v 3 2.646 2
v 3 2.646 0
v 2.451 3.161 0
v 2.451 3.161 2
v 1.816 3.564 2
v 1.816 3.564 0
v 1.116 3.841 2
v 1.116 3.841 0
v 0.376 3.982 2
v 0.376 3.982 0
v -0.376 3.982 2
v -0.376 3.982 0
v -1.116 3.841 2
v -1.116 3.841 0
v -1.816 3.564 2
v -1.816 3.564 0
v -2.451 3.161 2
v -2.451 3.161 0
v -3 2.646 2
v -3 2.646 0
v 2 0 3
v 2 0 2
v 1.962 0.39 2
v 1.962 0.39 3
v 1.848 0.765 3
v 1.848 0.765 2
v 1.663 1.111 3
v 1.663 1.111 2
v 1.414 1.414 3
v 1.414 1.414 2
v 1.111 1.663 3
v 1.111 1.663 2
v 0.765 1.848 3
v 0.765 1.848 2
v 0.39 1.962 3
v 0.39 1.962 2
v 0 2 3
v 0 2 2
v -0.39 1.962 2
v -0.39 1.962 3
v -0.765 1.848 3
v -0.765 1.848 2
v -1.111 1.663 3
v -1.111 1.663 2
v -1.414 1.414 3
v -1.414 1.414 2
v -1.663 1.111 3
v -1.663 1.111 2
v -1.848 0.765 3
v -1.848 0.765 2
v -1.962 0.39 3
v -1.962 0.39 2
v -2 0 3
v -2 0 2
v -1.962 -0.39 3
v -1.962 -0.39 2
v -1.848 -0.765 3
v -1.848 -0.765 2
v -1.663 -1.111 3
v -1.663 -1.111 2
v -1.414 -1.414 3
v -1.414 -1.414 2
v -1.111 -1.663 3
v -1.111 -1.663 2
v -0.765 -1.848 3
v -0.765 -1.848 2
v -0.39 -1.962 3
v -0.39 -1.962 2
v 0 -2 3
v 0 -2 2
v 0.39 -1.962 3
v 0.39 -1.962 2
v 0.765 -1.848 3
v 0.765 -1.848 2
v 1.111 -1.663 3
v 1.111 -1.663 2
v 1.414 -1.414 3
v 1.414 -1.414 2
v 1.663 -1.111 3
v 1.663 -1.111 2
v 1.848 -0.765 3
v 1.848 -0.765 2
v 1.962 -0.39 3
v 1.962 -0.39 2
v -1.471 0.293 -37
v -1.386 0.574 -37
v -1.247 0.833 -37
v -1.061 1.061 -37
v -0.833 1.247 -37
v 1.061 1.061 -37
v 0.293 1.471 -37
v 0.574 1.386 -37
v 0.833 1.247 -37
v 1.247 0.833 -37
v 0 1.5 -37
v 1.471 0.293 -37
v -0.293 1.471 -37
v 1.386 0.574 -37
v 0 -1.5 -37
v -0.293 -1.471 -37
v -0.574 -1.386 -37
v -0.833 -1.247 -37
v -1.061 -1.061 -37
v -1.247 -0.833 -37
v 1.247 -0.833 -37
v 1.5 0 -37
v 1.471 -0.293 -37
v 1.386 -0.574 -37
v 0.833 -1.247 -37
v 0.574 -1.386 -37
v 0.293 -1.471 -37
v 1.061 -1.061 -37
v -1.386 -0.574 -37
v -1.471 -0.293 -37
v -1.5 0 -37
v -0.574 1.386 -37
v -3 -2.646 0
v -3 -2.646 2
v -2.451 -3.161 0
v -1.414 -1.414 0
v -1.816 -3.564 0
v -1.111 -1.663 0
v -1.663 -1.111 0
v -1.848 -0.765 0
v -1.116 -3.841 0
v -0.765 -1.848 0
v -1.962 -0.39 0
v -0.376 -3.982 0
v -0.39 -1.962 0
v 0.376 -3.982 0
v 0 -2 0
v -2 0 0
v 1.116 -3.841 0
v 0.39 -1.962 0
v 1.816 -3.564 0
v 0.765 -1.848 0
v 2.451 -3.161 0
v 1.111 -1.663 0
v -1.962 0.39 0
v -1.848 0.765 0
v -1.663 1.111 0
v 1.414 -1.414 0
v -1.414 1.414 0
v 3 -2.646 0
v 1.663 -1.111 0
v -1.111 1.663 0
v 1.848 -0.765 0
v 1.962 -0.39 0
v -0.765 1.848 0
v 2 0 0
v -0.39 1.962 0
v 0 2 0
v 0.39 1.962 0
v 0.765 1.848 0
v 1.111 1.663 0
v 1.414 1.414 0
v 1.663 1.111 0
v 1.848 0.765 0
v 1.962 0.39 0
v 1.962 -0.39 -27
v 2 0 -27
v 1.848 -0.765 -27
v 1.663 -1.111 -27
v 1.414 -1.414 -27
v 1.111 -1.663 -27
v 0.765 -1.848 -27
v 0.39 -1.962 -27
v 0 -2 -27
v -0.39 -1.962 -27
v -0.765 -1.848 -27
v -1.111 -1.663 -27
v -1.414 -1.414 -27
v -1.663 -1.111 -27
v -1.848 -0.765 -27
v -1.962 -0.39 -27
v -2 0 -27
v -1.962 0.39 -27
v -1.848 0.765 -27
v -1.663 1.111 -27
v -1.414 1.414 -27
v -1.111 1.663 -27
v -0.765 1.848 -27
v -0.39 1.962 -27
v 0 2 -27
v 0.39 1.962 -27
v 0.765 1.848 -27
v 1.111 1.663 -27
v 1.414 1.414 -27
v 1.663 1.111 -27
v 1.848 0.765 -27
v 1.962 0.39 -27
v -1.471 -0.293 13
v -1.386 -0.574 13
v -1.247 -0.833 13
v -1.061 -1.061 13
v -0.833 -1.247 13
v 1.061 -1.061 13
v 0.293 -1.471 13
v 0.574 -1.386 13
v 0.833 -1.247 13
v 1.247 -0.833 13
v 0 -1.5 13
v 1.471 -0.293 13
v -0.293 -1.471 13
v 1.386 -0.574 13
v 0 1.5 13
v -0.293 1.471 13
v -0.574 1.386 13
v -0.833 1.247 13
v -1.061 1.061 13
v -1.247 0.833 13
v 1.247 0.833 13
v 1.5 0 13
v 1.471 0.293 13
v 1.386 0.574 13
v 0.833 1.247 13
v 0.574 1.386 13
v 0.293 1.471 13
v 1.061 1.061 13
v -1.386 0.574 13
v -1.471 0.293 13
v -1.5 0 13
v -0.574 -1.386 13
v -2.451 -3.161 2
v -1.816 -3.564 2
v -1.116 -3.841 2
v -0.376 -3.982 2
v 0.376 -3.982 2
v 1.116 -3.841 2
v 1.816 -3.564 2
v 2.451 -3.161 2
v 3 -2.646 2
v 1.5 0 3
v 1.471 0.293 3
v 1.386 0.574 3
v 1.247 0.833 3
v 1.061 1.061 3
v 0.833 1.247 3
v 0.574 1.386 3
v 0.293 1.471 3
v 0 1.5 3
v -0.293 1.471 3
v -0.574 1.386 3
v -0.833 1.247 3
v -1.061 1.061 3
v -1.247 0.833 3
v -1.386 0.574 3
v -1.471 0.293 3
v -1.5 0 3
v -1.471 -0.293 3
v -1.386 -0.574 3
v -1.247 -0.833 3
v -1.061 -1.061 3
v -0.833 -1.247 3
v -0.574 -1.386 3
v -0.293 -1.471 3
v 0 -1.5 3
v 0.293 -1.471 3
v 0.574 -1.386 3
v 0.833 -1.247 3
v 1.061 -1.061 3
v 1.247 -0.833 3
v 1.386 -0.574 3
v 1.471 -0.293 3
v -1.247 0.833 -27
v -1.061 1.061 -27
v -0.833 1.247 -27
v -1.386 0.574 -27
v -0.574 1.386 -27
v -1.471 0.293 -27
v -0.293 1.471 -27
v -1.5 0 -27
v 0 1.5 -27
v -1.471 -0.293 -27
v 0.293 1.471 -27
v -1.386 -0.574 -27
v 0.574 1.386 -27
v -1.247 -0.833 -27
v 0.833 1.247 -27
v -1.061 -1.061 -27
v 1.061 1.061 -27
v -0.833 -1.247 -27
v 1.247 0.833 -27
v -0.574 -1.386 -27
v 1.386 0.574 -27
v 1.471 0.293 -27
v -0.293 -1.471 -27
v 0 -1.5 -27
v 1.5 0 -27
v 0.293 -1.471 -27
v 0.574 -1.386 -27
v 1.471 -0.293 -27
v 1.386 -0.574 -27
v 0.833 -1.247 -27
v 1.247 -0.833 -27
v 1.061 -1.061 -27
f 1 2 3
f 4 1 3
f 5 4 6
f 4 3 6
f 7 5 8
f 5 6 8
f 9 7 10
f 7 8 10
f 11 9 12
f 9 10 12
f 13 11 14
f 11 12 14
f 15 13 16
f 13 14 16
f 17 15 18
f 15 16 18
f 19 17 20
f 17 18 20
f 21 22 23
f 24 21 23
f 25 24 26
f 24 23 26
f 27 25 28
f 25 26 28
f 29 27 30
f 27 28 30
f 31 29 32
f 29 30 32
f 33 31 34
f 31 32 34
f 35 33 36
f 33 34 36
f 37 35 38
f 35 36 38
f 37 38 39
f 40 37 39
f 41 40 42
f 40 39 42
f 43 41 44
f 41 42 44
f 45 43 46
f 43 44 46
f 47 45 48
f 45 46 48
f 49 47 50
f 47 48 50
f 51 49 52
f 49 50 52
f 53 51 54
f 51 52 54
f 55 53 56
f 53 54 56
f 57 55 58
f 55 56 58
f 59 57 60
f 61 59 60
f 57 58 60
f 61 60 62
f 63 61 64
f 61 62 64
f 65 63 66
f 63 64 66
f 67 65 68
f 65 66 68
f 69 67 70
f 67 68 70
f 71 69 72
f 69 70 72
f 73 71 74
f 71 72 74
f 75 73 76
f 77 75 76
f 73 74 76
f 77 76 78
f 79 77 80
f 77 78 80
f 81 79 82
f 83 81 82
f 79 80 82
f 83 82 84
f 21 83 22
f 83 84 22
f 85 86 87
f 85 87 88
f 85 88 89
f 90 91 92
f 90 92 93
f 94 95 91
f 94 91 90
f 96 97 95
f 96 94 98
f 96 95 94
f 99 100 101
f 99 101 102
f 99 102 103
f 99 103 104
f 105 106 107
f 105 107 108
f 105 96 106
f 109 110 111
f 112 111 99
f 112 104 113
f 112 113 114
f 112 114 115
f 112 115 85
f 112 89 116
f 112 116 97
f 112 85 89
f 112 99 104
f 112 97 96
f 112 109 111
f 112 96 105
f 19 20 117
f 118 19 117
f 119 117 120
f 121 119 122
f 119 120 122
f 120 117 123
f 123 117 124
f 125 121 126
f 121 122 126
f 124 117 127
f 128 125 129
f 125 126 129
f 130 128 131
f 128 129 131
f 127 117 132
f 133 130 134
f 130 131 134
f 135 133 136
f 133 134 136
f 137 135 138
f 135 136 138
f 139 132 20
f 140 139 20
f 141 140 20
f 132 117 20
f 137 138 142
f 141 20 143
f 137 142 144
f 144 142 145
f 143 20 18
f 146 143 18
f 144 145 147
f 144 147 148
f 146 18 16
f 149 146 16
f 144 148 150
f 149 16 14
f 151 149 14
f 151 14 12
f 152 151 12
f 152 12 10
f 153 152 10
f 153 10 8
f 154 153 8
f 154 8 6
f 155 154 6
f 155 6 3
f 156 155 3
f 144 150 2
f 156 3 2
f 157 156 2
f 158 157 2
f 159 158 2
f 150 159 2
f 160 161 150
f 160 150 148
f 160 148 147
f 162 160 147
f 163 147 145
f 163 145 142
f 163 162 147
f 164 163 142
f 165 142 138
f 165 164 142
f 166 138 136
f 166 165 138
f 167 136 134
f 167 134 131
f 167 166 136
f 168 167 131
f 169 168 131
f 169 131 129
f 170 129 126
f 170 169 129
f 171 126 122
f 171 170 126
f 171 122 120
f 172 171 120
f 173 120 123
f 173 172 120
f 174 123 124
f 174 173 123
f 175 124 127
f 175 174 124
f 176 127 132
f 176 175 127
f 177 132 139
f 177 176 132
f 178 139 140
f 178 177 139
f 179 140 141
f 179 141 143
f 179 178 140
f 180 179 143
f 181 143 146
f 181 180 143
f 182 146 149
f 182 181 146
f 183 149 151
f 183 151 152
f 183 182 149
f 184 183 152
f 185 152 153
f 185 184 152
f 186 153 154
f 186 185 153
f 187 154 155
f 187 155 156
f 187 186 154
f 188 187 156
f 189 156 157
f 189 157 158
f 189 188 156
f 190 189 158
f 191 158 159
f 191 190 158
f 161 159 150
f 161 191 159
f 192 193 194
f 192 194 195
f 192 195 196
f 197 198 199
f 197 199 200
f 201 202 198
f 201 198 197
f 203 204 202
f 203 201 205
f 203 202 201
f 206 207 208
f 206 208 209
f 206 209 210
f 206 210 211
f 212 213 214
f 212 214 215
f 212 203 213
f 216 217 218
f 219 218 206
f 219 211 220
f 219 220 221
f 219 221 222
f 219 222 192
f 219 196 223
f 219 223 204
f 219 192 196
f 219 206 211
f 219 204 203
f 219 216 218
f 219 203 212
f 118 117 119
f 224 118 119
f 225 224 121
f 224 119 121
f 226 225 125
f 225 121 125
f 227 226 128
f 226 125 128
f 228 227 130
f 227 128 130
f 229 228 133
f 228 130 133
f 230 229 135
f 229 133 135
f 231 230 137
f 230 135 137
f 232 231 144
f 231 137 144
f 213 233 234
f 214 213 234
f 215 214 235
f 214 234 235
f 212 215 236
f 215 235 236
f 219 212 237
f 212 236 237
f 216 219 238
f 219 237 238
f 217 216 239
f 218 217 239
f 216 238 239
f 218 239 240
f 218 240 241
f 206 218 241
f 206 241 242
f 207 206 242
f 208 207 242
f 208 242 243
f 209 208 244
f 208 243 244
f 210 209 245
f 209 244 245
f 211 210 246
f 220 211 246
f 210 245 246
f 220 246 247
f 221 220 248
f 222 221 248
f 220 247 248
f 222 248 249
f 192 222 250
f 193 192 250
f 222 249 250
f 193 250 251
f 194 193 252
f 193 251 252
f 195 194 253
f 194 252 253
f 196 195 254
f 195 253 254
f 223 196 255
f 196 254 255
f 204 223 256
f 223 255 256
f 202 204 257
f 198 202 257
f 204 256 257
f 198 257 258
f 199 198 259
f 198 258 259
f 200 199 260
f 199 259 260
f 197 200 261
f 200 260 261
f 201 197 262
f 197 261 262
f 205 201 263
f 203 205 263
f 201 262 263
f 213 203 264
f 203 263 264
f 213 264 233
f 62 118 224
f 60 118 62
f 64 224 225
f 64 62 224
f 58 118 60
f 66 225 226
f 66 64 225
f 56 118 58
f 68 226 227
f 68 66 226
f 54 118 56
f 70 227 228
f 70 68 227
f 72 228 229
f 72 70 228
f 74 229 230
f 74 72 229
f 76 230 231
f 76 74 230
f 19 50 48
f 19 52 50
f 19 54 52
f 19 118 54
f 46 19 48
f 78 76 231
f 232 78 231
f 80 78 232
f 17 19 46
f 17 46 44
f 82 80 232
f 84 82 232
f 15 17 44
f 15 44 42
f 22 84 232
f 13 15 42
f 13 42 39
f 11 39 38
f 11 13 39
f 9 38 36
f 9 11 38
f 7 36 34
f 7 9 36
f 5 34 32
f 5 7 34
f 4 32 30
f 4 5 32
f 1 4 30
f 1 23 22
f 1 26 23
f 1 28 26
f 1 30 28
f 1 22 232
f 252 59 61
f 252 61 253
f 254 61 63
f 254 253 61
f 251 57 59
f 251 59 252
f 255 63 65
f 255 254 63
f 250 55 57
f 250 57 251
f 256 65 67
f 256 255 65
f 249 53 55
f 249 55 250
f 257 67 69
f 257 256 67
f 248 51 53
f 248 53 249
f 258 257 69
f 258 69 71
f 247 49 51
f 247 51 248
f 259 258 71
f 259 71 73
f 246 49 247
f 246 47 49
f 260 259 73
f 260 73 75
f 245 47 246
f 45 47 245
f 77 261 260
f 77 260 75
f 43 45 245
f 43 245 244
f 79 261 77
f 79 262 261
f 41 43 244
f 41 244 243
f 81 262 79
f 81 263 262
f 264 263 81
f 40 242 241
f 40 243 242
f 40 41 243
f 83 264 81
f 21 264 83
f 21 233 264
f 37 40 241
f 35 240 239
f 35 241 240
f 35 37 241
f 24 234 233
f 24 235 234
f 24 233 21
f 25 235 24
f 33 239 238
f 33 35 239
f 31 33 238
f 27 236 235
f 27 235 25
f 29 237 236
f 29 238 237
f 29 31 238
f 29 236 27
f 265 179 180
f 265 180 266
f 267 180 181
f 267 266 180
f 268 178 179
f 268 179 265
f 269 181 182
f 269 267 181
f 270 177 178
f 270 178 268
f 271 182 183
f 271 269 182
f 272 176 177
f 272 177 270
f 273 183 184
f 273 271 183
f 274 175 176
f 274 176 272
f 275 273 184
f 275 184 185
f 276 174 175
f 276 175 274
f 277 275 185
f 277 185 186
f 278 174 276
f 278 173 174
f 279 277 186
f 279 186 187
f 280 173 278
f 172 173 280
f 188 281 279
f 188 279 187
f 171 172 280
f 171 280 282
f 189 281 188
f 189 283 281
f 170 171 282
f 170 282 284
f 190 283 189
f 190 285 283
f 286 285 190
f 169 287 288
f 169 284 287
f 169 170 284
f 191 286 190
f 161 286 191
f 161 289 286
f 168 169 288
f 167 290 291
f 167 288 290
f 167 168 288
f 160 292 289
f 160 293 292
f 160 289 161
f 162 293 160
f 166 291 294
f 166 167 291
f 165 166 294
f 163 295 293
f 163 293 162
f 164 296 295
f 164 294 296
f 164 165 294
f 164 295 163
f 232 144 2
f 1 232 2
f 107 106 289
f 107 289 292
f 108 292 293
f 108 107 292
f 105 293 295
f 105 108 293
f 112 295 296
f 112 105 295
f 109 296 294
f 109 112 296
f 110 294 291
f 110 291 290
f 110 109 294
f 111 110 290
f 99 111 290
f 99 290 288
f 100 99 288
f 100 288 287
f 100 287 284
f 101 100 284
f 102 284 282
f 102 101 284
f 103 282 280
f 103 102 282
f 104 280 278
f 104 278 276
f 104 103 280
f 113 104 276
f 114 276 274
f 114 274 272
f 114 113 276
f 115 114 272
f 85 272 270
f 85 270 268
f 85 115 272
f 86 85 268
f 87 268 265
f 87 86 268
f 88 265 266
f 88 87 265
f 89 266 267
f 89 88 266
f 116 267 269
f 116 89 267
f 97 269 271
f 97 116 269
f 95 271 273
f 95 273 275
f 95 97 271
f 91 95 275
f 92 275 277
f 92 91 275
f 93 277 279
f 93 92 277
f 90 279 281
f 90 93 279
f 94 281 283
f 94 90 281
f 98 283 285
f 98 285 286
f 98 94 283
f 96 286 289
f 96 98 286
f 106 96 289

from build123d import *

# Parameters (mm, degrees)
EXTRUDE_1_DEPTH = 2
SKETCH_2_R      = 2
EXTRUDE_2_DEPTH = 1
SKETCH_3_R      = 1.5
EXTRUDE_3_DEPTH = 10
EXTRUDE_START   = 27
SKETCH_4_R      = 2
EXTRUDE_4_DEPTH = 27
EXTRUDE_START_2 = 10
SKETCH_5_R      = 1.5
EXTRUDE_5_DEPTH = 10


with BuildPart() as part:
    # 草图1 → 凸台-拉伸1 (new body)
    with BuildSketch(Plane.XY):
        with BuildLine():
            Line((-3, 2.645751311), (-3, -2.645751311))
            ThreePointArc((-3, -2.645751311), (0, -4), (3, -2.645751311))
            Line((3, -2.645751311), (3, 2.645751311))
            ThreePointArc((3, 2.645751311), (0, 4), (-3, 2.645751311))
        make_face()
    extrude(amount=EXTRUDE_1_DEPTH)

    # 草图2 → 凸台-拉伸2 (add)
    with BuildSketch(Plane.XY.offset(2)):
        Circle(SKETCH_2_R)
    extrude(amount=EXTRUDE_2_DEPTH)

    # 草图3 → 凸台-拉伸3 (add)
    with BuildSketch(Plane.XY.offset(3)):
        Circle(SKETCH_3_R)
    extrude(amount=EXTRUDE_3_DEPTH)

    # 草图4 → 凸台-拉伸4 (add)
    with BuildSketch(Plane(origin=(0, 0, 0), x_dir=(-1, 0, 0), z_dir=(0, 0, -1)).offset(EXTRUDE_START)):
        with Locations(Location((0, 0, 0), (0, 0, 180))):
            Circle(SKETCH_4_R)
    extrude(amount=-EXTRUDE_4_DEPTH)

    # 草图5 → 凸台-拉伸5 (add)
    with BuildSketch(Plane(origin=(0, 0, -27), x_dir=(-1, 0, 0), z_dir=(0, 0, -1)).offset(EXTRUDE_START_2)):
        with Locations(Location((0, 0, 0), (0, 0, 180))):
            Circle(SKETCH_5_R)
    extrude(amount=-EXTRUDE_5_DEPTH)


solid = part.part
